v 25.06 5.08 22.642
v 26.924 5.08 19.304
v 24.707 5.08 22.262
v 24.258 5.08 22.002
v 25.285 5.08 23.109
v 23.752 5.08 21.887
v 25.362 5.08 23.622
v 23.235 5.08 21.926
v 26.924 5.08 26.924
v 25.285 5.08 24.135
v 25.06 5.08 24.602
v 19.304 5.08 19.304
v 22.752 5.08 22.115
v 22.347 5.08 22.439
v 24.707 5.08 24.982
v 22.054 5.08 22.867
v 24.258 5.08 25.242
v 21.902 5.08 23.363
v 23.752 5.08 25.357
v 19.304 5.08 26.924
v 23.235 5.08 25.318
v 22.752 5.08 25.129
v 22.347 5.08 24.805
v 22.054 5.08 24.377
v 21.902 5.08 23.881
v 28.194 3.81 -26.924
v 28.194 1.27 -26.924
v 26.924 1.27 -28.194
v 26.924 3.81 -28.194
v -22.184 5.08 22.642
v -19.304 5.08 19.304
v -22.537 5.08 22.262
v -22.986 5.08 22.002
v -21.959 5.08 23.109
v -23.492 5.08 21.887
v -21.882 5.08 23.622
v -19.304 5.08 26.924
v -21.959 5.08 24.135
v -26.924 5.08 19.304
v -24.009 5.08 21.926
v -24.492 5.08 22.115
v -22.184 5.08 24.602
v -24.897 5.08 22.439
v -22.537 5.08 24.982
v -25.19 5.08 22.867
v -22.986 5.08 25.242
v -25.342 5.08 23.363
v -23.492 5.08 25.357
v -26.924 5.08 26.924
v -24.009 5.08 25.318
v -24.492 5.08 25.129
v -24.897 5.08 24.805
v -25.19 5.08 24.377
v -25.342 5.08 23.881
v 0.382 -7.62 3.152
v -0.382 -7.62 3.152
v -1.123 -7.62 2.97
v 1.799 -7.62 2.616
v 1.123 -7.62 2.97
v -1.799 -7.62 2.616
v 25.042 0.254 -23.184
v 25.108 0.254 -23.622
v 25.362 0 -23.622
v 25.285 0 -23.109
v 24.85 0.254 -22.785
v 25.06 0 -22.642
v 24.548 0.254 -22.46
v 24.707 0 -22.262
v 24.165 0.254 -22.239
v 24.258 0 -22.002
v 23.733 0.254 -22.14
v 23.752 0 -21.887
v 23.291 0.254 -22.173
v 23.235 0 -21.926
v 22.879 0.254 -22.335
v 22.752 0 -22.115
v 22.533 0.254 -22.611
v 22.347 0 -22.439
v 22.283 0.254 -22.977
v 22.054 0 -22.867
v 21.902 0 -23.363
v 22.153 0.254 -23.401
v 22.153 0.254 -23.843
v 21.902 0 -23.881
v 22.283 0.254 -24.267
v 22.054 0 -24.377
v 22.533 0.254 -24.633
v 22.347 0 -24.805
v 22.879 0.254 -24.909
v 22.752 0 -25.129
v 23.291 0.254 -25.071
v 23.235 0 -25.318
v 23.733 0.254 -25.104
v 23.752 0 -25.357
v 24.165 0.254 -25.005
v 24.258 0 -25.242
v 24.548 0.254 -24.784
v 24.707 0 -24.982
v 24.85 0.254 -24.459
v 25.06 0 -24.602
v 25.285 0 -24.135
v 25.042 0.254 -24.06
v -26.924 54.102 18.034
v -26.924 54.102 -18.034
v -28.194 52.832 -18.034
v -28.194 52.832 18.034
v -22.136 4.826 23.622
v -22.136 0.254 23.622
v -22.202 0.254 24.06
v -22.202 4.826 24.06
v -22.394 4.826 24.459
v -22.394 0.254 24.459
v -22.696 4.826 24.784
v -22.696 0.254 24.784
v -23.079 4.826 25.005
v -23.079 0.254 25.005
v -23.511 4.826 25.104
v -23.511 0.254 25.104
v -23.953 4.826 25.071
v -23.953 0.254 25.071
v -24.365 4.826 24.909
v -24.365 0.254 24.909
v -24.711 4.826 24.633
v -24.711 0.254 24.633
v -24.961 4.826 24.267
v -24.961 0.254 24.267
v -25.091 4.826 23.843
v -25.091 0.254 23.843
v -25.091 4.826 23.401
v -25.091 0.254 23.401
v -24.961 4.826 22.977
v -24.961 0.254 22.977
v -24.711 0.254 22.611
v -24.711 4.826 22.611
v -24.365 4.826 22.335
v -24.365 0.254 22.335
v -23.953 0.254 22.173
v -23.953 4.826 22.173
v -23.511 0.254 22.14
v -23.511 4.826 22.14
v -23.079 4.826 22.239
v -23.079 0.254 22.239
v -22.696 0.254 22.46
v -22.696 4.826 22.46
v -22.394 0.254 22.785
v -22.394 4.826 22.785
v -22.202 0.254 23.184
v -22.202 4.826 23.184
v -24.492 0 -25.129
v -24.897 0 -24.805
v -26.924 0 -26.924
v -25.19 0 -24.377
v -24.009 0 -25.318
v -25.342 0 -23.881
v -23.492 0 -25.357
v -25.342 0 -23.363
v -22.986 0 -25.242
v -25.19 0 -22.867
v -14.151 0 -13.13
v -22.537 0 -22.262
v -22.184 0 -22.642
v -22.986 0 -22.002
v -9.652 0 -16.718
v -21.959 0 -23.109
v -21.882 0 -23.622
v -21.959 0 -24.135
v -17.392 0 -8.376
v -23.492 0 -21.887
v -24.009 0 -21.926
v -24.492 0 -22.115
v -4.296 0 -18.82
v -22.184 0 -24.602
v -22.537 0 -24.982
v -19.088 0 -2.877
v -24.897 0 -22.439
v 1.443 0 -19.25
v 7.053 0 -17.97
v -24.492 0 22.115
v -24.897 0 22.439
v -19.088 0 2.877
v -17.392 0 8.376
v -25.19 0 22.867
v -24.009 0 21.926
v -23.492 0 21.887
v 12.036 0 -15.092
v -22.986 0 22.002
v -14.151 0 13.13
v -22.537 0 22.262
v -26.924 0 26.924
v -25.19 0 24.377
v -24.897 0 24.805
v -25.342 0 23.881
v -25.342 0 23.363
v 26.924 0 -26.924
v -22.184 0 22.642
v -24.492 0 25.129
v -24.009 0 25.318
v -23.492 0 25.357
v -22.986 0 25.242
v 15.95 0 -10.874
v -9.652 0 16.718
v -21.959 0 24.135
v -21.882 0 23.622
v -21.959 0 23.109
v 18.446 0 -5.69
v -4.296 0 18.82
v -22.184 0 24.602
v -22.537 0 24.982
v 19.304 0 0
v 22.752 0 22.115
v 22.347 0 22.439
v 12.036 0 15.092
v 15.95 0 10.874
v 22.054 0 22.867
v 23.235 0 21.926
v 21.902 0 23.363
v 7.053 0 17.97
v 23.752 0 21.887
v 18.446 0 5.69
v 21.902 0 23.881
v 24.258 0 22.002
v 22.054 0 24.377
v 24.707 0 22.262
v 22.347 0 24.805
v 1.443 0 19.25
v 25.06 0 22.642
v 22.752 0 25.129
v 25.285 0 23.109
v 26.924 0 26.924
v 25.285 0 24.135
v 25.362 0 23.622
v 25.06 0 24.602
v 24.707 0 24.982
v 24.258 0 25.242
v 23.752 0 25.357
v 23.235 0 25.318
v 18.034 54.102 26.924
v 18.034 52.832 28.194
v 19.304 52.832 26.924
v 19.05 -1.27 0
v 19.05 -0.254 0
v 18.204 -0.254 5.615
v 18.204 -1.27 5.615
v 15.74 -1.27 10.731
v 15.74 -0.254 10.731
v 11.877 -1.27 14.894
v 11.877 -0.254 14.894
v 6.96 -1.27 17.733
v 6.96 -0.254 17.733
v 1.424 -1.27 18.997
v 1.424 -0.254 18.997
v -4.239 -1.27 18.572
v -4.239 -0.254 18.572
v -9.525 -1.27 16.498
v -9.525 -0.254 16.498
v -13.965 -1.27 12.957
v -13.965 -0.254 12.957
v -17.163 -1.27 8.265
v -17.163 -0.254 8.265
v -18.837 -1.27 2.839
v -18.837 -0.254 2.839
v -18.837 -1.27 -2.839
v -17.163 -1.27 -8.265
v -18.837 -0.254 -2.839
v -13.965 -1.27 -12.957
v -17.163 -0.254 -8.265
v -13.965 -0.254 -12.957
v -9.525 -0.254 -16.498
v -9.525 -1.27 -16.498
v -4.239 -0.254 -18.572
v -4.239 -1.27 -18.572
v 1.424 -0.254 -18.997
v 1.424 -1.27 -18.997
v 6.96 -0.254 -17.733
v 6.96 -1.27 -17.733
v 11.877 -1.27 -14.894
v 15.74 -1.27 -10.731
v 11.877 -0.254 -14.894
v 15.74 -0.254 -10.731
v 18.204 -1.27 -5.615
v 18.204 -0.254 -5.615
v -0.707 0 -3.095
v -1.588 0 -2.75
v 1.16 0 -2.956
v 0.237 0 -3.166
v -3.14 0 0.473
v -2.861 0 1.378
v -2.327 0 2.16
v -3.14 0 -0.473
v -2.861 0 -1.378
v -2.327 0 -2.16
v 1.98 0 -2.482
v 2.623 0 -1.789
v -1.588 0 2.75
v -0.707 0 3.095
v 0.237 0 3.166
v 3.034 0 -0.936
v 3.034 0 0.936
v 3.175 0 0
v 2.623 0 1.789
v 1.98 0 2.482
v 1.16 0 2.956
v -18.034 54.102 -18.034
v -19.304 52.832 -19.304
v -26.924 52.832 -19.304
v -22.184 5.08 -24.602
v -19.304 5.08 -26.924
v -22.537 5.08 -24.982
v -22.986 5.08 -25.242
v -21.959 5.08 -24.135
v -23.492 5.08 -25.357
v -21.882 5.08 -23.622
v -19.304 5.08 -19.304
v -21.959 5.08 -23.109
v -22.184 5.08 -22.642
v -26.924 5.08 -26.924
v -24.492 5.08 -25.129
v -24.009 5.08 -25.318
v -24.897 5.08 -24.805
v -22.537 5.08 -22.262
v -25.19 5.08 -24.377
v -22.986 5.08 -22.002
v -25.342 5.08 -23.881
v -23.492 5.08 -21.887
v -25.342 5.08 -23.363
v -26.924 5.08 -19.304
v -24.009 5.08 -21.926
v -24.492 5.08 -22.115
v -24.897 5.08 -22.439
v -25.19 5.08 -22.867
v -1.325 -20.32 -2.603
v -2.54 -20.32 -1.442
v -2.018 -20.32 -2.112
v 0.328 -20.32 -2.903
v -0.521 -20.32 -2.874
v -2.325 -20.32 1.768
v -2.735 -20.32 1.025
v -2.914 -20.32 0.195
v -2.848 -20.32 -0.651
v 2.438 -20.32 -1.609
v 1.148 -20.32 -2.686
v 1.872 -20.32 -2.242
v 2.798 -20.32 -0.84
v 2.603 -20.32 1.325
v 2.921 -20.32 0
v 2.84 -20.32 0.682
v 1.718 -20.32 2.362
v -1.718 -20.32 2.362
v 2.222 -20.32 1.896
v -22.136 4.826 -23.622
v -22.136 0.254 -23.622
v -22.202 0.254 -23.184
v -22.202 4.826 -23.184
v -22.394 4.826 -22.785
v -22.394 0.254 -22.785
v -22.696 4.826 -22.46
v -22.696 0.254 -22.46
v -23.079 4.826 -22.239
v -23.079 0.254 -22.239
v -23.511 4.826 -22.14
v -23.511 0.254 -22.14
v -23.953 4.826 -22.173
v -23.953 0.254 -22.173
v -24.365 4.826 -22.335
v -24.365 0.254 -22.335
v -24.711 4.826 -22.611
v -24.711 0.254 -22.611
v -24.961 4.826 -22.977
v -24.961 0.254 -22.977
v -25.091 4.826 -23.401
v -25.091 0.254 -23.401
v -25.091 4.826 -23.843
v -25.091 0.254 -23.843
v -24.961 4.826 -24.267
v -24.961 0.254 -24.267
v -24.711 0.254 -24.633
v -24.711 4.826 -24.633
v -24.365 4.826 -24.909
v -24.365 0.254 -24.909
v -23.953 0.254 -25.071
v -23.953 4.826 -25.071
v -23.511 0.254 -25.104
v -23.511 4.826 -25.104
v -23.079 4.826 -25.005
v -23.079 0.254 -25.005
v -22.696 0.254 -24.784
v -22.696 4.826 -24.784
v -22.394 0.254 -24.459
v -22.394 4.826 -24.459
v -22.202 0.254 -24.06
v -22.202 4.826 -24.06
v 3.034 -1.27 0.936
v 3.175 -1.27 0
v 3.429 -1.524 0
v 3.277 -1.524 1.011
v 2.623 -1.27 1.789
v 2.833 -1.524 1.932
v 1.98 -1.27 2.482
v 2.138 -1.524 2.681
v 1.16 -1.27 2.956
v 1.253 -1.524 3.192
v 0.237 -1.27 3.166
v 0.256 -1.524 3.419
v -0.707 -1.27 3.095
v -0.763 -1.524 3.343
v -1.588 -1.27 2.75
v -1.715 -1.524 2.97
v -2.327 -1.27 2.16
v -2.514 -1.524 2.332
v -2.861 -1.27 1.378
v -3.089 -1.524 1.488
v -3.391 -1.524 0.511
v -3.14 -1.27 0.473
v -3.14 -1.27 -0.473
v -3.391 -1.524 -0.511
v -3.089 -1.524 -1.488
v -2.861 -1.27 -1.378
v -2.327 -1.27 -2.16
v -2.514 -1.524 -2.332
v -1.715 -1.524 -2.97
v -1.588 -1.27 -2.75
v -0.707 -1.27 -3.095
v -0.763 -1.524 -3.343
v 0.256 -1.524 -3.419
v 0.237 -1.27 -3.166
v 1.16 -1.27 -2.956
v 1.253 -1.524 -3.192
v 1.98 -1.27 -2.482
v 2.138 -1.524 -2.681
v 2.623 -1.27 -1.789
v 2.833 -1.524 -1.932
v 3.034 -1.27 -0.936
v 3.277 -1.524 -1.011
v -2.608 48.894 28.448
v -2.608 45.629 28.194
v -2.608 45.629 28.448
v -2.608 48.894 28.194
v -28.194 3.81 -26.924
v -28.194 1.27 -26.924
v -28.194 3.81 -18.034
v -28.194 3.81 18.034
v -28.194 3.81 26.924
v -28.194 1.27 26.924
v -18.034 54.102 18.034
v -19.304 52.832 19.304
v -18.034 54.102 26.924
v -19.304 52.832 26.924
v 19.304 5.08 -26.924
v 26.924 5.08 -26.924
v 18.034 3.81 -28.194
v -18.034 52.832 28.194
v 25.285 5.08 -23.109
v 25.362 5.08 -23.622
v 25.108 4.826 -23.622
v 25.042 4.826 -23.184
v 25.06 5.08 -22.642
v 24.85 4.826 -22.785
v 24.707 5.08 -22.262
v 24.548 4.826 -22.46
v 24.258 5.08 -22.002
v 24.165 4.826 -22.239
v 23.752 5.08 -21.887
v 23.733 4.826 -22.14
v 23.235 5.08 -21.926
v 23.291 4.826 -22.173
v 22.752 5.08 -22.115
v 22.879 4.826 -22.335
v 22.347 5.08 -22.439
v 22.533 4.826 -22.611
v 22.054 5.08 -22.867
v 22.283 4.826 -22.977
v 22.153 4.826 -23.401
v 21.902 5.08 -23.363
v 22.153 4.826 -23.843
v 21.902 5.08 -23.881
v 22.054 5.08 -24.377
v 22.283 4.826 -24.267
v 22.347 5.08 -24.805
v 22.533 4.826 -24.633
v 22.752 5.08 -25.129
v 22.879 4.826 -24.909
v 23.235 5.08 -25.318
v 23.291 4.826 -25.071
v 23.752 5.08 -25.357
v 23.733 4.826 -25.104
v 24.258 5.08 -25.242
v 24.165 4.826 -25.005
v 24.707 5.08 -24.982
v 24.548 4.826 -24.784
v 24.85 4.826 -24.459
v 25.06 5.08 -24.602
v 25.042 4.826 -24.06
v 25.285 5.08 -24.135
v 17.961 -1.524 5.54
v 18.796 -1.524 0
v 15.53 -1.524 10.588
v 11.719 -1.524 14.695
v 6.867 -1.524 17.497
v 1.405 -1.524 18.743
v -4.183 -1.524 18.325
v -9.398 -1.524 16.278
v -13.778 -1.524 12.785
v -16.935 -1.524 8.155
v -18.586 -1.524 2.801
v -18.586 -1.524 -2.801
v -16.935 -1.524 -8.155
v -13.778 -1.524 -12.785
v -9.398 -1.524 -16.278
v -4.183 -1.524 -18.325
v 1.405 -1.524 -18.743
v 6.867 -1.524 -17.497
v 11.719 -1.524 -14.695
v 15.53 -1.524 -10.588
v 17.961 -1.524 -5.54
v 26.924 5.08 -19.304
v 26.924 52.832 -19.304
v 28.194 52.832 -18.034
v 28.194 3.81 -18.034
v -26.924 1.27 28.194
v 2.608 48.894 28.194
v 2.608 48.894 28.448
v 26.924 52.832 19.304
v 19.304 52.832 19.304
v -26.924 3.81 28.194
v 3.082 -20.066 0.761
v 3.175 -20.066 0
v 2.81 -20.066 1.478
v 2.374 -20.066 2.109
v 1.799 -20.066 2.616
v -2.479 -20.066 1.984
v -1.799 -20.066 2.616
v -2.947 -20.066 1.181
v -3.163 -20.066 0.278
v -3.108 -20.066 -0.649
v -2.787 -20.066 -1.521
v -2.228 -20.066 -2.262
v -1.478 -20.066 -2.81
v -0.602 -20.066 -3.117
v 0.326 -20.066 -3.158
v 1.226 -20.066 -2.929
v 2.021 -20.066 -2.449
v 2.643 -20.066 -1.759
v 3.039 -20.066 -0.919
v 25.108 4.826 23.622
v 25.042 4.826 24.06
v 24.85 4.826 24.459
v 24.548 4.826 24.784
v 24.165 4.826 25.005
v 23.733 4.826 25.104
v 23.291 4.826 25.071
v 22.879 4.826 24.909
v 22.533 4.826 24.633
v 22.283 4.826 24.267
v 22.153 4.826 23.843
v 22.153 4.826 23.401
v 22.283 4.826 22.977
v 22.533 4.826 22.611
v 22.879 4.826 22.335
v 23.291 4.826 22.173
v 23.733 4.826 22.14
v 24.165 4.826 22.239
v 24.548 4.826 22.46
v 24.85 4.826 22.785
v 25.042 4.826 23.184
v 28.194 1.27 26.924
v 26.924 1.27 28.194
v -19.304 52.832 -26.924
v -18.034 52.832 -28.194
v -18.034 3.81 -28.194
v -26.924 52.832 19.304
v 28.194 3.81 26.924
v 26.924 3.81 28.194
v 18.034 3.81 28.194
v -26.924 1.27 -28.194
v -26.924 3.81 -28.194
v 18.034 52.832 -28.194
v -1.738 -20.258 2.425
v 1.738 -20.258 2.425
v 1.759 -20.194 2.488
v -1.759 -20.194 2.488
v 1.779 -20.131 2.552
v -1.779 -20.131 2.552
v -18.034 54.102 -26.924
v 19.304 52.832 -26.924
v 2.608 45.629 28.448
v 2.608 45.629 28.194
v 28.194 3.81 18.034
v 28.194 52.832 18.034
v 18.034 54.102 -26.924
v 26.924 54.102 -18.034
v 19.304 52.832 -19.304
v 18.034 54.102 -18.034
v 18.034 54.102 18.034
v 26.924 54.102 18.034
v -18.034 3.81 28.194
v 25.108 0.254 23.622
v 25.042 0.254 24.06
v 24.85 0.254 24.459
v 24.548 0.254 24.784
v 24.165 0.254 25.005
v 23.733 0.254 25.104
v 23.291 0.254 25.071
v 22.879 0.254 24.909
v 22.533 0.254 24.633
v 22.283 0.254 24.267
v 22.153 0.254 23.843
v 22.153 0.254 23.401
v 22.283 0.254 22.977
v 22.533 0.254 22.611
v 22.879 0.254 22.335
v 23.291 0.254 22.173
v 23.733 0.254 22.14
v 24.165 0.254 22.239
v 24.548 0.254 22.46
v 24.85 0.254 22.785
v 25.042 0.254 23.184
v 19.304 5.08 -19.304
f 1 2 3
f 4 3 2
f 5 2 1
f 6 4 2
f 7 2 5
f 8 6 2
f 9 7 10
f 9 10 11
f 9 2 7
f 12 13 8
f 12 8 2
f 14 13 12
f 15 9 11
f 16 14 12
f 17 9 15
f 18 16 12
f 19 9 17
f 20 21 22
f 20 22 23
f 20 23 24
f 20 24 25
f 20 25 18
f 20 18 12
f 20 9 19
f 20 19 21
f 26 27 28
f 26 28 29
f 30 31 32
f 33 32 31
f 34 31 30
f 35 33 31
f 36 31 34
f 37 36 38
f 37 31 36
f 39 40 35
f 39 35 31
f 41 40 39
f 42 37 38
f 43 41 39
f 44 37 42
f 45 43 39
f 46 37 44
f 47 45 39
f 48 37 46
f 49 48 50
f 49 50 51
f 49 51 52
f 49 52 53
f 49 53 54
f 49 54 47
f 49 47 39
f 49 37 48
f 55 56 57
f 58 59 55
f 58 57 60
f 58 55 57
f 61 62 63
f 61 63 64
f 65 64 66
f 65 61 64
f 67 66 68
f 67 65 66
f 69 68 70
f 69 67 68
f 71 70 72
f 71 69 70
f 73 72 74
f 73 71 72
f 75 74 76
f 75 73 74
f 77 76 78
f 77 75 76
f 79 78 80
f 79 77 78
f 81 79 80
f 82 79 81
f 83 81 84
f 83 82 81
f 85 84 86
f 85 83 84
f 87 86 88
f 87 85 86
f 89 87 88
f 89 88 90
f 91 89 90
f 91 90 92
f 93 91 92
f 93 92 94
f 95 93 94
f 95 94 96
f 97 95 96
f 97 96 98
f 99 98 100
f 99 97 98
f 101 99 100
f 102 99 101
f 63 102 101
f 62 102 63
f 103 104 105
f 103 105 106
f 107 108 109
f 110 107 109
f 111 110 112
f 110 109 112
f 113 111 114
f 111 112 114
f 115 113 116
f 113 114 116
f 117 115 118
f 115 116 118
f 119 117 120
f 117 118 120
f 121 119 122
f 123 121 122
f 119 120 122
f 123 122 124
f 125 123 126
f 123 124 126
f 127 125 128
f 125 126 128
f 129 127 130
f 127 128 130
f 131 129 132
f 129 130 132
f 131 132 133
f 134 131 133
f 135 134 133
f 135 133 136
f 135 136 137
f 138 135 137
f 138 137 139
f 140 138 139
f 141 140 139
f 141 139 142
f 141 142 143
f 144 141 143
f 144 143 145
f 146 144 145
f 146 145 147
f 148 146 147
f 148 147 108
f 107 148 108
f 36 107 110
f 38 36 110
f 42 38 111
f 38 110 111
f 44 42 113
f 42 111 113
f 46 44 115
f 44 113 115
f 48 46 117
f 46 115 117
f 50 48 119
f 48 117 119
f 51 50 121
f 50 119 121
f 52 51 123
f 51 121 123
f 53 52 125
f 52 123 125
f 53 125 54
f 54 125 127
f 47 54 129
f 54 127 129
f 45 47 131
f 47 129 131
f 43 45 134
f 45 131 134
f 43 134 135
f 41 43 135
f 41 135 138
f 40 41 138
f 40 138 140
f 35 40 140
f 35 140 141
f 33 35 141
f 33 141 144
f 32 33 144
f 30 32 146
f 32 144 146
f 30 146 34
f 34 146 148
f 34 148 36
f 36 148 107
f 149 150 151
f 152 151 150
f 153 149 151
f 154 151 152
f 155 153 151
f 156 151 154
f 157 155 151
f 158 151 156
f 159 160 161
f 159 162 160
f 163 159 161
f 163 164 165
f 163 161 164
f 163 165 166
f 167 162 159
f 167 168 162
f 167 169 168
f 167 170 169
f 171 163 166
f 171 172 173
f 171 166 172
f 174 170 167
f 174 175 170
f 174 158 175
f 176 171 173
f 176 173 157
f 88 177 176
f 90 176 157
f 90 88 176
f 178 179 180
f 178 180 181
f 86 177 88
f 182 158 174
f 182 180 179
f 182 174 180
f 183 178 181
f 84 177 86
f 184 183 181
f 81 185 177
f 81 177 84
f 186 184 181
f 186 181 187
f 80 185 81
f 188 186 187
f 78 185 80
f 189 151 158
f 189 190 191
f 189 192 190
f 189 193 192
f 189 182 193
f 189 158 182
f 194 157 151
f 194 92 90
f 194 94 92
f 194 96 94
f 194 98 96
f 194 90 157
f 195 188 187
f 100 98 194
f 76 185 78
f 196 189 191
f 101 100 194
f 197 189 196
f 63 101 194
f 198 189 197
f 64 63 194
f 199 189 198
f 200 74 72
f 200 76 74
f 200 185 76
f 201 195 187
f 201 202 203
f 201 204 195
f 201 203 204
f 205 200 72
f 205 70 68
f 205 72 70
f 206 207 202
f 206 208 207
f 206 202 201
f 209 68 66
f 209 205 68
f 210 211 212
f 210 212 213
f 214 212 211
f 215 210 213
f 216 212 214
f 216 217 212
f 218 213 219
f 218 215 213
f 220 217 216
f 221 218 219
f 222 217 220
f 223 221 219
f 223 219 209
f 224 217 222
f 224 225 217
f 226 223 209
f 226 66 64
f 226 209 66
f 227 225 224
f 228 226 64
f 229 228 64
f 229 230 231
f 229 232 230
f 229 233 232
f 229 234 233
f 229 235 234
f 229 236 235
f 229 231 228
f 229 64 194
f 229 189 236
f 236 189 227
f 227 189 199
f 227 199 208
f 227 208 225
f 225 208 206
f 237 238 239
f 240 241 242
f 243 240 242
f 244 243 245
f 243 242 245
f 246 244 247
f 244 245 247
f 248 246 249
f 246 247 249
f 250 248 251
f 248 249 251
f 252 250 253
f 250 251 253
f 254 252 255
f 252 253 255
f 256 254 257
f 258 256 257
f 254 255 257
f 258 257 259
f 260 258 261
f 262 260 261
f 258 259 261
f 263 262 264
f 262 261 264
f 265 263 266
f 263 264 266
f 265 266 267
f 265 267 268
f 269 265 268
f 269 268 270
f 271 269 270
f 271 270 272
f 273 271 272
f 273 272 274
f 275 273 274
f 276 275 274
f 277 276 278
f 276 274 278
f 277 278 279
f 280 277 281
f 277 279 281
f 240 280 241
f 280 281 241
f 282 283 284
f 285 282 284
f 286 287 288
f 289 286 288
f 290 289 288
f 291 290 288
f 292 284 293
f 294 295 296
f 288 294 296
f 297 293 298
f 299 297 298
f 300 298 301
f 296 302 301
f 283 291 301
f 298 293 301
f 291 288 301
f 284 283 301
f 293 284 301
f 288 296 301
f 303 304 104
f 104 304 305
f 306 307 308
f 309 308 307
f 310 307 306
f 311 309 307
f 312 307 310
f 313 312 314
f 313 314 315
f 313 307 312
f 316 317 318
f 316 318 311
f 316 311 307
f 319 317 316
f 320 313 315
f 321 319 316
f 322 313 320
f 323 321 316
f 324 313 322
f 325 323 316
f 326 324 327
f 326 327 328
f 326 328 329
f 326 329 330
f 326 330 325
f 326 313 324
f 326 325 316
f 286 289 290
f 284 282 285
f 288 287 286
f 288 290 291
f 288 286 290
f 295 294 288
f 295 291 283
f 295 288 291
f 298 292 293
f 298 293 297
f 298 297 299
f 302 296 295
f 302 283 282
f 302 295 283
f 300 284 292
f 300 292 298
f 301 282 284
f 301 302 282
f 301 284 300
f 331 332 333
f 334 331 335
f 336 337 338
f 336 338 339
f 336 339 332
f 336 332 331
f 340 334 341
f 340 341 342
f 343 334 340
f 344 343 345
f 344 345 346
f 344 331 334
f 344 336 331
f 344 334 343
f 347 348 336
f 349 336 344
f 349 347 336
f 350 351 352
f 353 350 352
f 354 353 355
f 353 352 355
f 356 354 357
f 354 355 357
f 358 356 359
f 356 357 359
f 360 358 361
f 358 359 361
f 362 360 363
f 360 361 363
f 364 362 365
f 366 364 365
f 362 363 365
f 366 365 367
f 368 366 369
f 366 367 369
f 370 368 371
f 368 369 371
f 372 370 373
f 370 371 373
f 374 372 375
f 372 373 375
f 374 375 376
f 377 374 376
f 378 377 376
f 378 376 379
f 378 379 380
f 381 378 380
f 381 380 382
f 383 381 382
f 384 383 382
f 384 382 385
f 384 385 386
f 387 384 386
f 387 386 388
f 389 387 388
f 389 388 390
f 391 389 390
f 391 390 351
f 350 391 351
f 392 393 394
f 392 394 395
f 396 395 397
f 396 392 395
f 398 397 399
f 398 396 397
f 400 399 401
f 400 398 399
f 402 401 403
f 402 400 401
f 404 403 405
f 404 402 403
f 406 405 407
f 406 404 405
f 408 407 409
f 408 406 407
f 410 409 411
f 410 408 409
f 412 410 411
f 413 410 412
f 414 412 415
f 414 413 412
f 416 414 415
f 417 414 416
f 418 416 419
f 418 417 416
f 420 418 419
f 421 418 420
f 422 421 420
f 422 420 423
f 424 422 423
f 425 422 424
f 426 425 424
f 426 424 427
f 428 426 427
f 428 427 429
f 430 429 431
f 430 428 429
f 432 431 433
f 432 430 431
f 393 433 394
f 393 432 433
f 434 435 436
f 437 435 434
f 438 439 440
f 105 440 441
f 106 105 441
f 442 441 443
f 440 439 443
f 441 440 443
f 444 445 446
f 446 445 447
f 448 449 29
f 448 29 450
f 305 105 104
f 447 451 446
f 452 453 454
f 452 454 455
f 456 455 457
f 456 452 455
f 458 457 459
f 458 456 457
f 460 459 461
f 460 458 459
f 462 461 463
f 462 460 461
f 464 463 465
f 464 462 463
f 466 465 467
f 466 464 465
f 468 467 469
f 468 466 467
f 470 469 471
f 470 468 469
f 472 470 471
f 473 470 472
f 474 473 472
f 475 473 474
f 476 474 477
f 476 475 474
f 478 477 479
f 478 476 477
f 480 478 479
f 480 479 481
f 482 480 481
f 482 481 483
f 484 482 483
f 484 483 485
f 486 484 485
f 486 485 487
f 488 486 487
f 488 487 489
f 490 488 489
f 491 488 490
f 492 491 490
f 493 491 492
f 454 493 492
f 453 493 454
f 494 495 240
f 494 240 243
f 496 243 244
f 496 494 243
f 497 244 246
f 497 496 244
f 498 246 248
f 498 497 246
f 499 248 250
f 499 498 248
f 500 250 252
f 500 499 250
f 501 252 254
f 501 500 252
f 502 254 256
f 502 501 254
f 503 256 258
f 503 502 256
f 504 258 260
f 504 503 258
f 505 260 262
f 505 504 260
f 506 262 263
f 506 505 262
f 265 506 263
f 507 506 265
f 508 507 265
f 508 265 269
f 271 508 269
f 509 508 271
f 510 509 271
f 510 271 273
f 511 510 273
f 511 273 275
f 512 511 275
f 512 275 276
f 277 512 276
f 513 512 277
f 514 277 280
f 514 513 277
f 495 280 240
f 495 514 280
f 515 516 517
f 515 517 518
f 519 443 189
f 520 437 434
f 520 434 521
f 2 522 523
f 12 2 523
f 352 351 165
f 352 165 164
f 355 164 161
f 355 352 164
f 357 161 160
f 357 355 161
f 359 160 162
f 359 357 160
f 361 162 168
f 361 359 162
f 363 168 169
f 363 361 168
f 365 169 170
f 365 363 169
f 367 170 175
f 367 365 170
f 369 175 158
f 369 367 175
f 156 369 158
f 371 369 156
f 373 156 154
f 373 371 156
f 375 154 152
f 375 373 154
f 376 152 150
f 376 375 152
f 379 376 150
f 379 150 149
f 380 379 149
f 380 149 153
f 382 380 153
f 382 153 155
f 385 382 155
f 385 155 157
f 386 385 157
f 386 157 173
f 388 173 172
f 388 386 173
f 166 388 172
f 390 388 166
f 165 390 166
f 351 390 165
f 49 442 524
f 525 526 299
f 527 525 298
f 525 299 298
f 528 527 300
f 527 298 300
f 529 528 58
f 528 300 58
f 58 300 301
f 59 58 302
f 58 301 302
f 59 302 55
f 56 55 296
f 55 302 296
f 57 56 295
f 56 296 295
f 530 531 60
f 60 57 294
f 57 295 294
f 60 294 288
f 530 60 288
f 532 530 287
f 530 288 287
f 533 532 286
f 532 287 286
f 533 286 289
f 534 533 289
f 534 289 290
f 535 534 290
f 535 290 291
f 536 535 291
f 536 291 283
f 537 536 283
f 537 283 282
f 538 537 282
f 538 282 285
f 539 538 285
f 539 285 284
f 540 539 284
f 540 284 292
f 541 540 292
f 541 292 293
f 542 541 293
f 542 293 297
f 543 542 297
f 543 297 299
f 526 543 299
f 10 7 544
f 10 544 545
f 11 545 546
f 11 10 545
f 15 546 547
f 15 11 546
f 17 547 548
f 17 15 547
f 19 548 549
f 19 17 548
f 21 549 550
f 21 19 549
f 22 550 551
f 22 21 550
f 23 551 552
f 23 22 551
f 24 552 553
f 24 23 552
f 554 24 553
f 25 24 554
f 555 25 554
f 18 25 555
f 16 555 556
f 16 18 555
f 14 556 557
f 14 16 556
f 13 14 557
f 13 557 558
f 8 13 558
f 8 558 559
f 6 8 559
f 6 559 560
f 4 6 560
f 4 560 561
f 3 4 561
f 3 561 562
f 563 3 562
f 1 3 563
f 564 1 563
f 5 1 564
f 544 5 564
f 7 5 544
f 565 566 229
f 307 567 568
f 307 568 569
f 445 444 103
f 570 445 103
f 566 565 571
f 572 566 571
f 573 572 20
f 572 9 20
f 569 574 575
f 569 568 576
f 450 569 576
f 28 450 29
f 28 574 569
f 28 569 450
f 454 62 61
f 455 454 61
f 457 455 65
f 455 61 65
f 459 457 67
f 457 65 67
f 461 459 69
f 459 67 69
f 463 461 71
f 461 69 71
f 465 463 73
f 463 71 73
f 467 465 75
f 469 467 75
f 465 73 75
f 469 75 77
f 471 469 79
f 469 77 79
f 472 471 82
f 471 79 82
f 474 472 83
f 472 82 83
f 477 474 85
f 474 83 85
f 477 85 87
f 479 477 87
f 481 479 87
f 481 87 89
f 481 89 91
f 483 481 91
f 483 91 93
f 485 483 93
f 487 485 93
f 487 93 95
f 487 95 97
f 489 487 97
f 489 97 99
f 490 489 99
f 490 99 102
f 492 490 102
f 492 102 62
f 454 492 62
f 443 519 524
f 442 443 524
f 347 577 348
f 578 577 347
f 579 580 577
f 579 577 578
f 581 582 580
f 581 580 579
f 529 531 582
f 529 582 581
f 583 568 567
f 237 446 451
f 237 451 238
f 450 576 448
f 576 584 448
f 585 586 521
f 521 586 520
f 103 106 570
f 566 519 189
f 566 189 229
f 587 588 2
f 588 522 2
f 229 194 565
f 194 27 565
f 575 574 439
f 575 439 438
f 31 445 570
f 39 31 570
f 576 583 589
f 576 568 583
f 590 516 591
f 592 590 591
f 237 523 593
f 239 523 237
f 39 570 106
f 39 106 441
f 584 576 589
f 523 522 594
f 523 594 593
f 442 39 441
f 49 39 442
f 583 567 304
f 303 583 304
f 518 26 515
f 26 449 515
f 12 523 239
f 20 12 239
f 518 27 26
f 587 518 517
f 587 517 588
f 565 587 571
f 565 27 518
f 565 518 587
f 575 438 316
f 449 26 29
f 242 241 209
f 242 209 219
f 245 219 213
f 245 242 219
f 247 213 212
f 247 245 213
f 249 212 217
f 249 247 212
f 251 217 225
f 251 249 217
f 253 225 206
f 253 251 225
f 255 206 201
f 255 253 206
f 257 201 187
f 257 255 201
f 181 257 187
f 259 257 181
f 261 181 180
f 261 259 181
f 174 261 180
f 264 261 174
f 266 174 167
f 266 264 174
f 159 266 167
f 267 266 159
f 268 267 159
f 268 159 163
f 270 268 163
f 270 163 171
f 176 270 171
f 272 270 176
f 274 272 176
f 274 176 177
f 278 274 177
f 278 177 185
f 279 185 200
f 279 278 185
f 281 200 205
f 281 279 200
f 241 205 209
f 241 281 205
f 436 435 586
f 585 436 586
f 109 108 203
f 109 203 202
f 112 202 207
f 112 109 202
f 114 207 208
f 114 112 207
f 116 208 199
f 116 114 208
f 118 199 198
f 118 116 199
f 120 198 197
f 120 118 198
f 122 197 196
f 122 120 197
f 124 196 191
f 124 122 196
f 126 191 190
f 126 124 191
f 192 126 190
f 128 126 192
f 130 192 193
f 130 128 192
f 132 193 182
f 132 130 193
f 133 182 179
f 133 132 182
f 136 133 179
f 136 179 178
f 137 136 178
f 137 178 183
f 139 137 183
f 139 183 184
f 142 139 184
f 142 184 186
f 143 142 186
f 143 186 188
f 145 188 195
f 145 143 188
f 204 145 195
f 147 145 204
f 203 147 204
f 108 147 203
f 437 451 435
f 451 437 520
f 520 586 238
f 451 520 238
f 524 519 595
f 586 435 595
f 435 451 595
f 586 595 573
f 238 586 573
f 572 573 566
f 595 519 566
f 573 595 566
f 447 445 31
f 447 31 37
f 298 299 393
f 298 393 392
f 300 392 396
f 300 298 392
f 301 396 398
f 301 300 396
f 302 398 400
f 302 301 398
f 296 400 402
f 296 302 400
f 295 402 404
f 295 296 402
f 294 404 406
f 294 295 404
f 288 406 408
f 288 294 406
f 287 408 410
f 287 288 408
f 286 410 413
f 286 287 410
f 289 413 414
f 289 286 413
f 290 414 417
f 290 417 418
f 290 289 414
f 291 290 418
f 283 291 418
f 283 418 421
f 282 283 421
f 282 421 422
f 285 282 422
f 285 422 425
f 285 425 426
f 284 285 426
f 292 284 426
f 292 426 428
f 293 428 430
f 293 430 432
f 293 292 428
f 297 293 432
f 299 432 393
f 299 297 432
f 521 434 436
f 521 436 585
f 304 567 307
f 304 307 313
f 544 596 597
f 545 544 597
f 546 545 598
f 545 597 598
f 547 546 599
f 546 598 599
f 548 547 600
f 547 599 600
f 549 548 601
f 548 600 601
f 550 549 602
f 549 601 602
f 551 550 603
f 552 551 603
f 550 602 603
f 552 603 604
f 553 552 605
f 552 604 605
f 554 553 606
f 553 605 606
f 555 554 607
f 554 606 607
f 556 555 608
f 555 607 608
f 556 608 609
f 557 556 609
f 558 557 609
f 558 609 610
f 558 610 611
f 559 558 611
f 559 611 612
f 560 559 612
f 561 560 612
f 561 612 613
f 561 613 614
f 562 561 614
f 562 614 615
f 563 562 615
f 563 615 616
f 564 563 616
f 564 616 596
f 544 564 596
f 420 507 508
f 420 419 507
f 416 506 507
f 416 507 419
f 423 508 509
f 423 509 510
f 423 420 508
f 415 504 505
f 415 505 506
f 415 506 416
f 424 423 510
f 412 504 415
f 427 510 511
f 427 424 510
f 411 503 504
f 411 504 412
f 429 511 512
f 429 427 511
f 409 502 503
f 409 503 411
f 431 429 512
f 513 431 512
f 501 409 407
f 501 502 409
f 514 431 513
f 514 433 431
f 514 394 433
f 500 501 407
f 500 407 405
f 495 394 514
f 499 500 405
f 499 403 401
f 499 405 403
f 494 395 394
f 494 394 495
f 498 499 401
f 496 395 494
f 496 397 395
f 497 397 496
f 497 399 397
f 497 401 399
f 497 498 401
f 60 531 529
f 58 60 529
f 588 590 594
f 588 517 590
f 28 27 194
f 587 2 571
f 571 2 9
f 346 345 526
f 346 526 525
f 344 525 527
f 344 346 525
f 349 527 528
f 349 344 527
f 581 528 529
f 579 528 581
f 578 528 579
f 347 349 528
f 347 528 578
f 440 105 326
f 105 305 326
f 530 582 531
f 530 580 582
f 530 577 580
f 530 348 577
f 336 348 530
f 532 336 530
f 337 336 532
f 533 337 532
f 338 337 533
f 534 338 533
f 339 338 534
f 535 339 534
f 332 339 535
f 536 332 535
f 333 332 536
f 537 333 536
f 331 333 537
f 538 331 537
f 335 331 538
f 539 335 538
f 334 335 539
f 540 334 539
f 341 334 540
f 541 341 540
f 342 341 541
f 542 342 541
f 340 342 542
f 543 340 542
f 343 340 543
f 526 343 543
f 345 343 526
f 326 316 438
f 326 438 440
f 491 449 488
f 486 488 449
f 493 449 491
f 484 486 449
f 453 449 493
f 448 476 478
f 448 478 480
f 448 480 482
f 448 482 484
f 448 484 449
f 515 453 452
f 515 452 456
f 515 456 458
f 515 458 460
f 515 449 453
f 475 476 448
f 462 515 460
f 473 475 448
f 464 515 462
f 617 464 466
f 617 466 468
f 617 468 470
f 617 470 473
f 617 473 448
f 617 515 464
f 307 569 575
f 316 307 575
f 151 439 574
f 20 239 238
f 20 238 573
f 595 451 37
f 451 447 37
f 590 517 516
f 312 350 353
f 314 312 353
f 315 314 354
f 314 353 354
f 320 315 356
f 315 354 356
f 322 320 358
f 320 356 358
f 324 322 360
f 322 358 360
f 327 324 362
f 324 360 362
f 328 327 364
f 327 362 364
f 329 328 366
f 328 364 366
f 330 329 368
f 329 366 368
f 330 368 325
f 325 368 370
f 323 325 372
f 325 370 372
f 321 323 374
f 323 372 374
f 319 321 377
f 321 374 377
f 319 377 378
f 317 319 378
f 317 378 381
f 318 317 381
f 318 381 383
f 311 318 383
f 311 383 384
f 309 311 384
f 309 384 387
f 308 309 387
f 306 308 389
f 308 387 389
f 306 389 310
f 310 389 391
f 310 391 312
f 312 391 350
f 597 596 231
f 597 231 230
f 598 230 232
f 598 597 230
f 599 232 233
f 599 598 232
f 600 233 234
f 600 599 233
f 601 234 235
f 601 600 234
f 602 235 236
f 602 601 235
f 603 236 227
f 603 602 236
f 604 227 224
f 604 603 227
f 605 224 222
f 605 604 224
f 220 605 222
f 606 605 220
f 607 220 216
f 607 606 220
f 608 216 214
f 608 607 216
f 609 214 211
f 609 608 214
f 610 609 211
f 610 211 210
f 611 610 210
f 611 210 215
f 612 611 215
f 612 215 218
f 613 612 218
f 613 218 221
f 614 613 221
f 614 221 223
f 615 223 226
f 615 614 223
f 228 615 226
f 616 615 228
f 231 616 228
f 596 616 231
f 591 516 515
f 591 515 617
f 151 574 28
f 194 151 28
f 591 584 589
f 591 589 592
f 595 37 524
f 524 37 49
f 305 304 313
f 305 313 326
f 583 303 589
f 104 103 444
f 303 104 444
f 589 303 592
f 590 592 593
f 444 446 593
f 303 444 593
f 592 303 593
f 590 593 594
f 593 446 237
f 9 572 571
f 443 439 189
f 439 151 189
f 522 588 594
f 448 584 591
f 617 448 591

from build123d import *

# Parameters (mm, degrees)
F0_W      = 56.388
F0_H      = 56.388
F0_R      = 1.4859
F0_R_2    = 19.05
F0_R_3    = 3.175
F1_DEPTH  = 54.102
F2_DEPTH  = 1.524
F3_DEPTH  = 20.32
F5_DEPTH  = 12.7
F6_W      = 8.89
F6_H      = 8.89
F7_DEPTH  = 49.022
F8_SIZE   = 1.27
F9_SIZE   = 0.254
F9_2_SIZE = 0.254
F10_W     = 5.2164322697
F10_H     = 3.265157342
F11_DEPTH = 0.254


with BuildPart() as f1:
    # F0 (on Front) → F1 (new body)
    with BuildSketch(Plane.XZ):
        Rectangle(F0_W, F0_H)
        with Locations((-23.622, -23.622)):
            Circle(F0_R, mode=Mode.SUBTRACT)
        with Locations((23.622, -23.622)):
            Circle(F0_R, mode=Mode.SUBTRACT)
        with Locations((-23.622, 23.622)):
            Circle(F0_R, mode=Mode.SUBTRACT)
        Circle(F0_R_2, mode=Mode.SUBTRACT)
        with Locations((23.622, 23.622)):
            Circle(F0_R, mode=Mode.SUBTRACT)
        Circle(F0_R_2)
        Circle(F0_R_3, mode=Mode.SUBTRACT)
        Circle(F0_R_3)
    extrude(amount=-F1_DEPTH)

    # F0 (on Front) → F2 (join)
    with BuildSketch(Plane.XZ):
        Circle(F0_R_2)
        Circle(F0_R_3, mode=Mode.SUBTRACT)
    extrude(amount=F2_DEPTH)

    # F6 (on face) → F7 (cut)
    with BuildSketch(Plane(origin=(0, 54.102, 0), x_dir=(-1, 0, 0), z_dir=(0, 1, 0))):
        with Locations((-23.749, 23.749)):
            Rectangle(F6_W, F6_H)
        with Locations((23.749, 23.749)):
            Rectangle(F6_W, F6_H)
        with Locations((23.749, -23.749)):
            Rectangle(F6_W, F6_H)
        with Locations((-23.749, -23.749)):
            Rectangle(F6_W, F6_H)
    extrude(amount=-F7_DEPTH, mode=Mode.SUBTRACT)

    # F8
    f8_edges = [f1.edges().sort_by_distance(p)[0] for p in [
        (-28.194, 0, 0),
        (-28.194, 2.54, -28.194),
        (-28.194, 5.08, -23.749),
        (-28.194, 29.591, -19.304),
        (-28.194, 54.102, 0),
        (-28.194, 29.591, 19.304),
        (-28.194, 5.08, 23.749),
        (-28.194, 2.54, 28.194),
        (0, 0, 28.194),
        (-23.749, 5.08, 28.194),
        (-19.304, 29.591, 28.194),
        (0, 54.102, 28.194),
        (19.304, 29.591, 28.194),
        (23.749, 5.08, 28.194),
        (28.194, 2.54, 28.194),
        (28.194, 0, 0),
        (28.194, 5.08, 23.749),
        (28.194, 29.591, 19.304),
        (28.194, 54.102, 0),
        (28.194, 29.591, -19.304),
        (28.194, 5.08, -23.749),
        (28.194, 2.54, -28.194),
        (0, 0, -28.194),
        (23.749, 5.08, -28.194),
        (19.304, 29.591, -28.194),
        (0, 54.102, -28.194),
        (-19.304, 29.591, -28.194),
        (-23.749, 5.08, -28.194),
        (23.749, 54.102, -19.304),
        (19.304, 54.102, -23.749),
        (-19.304, 54.102, -23.749),
        (-23.749, 54.102, -19.304),
        (-23.749, 54.102, 19.304),
        (-19.304, 54.102, 23.749),
        (19.304, 54.102, 23.749),
        (23.749, 54.102, 19.304),
    ]]
    chamfer(f8_edges, length=F8_SIZE)

    # F9
    f9_edges = [f1.edges().sort_by_distance(p)[0] for p in [
        (-25.1079, 5.08, 23.622),
        (-25.1079, 5.08, -23.622),
        (22.1361, 5.08, 23.622),
        (22.1361, 5.08, -23.622),
        (22.1361, 0, -23.622),
        (22.1361, 0, 23.622),
        (-25.1079, 0, 23.622),
        (-25.1079, 0, -23.622),
        (-19.05, 0, 0),
        (-19.05, -1.524, 0),
        (-3.175, -1.524, 0),
    ]]
    chamfer(f9_edges, length=F9_SIZE)

    # F10 (on face) → F11 (join)
    with BuildSketch(Plane.XY.offset(28.194)):
        with Locations((0, 47.2612604499)):
            Rectangle(F10_W, F10_H)
    extrude(amount=F11_DEPTH)


with BuildPart() as f3:
    # F0 (on Front) → F3 (new body)
    with BuildSketch(Plane.XZ):
        Circle(F0_R_3)
    extrude(amount=F3_DEPTH)

    # F4 (on face) → F5 (cut)
    with BuildSketch(Plane.XZ.offset(20.32)):
        with BuildLine():
            ThreePointArc((1.7989226109, 2.6162), (0, 3.175), (-1.7989226109, 2.6162))
            Line((-1.7989226109, 2.6162), (1.7989226109, 2.6162))
        make_face()
    extrude(amount=-F5_DEPTH, mode=Mode.SUBTRACT)

    # F9#2
    f9_2_edges = [f3.edges().sort_by_distance(p)[0] for p in [
        (-1.478013, -20.32, -2.81),
        (0, -20.32, 2.6162),
    ]]
    chamfer(f9_2_edges, length=F9_2_SIZE)


solid = Compound([f1.part, f3.part])
